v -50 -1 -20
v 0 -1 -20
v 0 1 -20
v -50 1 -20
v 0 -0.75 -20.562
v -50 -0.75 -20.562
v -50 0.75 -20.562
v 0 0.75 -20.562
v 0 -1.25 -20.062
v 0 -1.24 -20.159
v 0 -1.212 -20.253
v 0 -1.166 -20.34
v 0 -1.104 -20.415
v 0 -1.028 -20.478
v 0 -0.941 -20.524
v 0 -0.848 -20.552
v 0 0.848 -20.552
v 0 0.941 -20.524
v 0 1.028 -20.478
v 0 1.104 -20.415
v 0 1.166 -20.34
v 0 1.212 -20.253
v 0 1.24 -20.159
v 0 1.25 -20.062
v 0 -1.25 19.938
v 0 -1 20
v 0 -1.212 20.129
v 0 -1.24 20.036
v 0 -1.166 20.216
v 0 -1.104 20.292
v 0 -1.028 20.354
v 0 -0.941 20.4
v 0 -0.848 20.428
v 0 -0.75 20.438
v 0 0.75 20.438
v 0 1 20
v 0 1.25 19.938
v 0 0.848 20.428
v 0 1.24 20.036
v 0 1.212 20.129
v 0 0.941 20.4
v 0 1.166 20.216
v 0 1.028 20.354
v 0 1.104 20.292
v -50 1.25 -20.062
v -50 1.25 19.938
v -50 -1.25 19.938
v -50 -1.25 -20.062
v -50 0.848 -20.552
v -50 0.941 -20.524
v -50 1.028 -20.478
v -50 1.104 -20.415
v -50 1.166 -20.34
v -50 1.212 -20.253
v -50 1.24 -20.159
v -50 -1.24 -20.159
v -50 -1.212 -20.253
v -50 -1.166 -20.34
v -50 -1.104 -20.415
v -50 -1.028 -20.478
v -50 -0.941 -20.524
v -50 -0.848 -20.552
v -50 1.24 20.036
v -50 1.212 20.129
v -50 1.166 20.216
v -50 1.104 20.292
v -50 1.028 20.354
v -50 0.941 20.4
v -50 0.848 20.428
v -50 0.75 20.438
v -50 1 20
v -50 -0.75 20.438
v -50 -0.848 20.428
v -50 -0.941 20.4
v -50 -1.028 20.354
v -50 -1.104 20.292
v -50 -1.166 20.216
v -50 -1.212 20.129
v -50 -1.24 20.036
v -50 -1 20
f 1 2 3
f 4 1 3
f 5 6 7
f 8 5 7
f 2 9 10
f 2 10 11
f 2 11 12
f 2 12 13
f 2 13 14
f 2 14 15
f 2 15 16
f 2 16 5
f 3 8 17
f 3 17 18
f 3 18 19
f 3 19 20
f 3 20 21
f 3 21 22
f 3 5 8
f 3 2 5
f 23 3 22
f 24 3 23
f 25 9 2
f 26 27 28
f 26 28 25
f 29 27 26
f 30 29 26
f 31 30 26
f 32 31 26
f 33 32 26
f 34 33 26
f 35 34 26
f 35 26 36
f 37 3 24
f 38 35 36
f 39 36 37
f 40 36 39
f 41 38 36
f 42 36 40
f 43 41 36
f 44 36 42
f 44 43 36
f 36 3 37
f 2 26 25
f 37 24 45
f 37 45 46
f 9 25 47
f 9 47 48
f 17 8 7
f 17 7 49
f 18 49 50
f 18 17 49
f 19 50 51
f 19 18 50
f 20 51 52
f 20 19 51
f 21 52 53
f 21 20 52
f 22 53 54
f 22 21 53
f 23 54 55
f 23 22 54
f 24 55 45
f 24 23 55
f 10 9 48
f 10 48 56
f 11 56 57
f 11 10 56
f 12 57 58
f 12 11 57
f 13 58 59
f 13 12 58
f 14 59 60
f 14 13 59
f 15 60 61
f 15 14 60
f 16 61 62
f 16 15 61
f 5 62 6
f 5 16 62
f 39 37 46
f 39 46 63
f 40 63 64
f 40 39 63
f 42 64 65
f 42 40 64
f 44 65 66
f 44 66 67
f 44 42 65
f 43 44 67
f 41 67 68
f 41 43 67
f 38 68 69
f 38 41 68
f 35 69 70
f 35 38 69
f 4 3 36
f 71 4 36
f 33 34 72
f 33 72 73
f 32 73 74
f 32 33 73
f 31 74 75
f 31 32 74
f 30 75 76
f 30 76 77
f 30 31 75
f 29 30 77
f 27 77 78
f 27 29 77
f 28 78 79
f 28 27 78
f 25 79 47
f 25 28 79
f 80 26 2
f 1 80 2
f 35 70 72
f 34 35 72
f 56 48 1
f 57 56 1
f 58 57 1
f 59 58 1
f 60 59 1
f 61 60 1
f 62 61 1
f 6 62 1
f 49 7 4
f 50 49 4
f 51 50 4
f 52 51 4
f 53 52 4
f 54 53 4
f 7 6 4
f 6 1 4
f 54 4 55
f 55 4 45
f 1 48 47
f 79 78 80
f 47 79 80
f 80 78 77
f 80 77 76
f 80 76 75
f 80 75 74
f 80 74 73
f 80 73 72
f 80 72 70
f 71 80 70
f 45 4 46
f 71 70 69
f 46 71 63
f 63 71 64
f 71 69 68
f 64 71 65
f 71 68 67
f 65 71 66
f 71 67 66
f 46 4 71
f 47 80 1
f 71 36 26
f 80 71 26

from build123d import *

# Parameters (mm, degrees)
F2_DEPTH = 50
F3_DEPTH = 50.001


with BuildPart() as f2:
    # F1 (on Right) → F2 (new body)
    with BuildSketch(Plane.YZ):
        with BuildLine():
            ThreePointArc((0.75, -20.561926), (1.103553, -20.415479), (1.25, -20.061926))
            Line((1.25, -20.061926), (1.25, 19.938074))
            ThreePointArc((1.25, 19.938074), (1.103553, 20.291627), (0.75, 20.438074))
            Line((0.75, 20.438074), (-0.75, 20.438074))
            ThreePointArc((-0.75, 20.438074), (-1.103553, 20.291627), (-1.25, 19.938074))
            Line((-1.25, 19.938074), (-1.25, -20.061926))
            ThreePointArc((-1.25, -20.061926), (-1.103553, -20.415479), (-0.75, -20.561926))
            Line((-0.75, -20.561926), (0.75, -20.561926))
        make_face()
    extrude(amount=-F2_DEPTH)

    # F0 (on Right) → F3 (cut, through all)
    with BuildSketch(Plane.YZ):
        Polygon((1, -20), (1, 0), (1, 20), (-1, 20), (-1, -20), align=None)
    extrude(amount=-F3_DEPTH, mode=Mode.SUBTRACT)


solid = f2.part
